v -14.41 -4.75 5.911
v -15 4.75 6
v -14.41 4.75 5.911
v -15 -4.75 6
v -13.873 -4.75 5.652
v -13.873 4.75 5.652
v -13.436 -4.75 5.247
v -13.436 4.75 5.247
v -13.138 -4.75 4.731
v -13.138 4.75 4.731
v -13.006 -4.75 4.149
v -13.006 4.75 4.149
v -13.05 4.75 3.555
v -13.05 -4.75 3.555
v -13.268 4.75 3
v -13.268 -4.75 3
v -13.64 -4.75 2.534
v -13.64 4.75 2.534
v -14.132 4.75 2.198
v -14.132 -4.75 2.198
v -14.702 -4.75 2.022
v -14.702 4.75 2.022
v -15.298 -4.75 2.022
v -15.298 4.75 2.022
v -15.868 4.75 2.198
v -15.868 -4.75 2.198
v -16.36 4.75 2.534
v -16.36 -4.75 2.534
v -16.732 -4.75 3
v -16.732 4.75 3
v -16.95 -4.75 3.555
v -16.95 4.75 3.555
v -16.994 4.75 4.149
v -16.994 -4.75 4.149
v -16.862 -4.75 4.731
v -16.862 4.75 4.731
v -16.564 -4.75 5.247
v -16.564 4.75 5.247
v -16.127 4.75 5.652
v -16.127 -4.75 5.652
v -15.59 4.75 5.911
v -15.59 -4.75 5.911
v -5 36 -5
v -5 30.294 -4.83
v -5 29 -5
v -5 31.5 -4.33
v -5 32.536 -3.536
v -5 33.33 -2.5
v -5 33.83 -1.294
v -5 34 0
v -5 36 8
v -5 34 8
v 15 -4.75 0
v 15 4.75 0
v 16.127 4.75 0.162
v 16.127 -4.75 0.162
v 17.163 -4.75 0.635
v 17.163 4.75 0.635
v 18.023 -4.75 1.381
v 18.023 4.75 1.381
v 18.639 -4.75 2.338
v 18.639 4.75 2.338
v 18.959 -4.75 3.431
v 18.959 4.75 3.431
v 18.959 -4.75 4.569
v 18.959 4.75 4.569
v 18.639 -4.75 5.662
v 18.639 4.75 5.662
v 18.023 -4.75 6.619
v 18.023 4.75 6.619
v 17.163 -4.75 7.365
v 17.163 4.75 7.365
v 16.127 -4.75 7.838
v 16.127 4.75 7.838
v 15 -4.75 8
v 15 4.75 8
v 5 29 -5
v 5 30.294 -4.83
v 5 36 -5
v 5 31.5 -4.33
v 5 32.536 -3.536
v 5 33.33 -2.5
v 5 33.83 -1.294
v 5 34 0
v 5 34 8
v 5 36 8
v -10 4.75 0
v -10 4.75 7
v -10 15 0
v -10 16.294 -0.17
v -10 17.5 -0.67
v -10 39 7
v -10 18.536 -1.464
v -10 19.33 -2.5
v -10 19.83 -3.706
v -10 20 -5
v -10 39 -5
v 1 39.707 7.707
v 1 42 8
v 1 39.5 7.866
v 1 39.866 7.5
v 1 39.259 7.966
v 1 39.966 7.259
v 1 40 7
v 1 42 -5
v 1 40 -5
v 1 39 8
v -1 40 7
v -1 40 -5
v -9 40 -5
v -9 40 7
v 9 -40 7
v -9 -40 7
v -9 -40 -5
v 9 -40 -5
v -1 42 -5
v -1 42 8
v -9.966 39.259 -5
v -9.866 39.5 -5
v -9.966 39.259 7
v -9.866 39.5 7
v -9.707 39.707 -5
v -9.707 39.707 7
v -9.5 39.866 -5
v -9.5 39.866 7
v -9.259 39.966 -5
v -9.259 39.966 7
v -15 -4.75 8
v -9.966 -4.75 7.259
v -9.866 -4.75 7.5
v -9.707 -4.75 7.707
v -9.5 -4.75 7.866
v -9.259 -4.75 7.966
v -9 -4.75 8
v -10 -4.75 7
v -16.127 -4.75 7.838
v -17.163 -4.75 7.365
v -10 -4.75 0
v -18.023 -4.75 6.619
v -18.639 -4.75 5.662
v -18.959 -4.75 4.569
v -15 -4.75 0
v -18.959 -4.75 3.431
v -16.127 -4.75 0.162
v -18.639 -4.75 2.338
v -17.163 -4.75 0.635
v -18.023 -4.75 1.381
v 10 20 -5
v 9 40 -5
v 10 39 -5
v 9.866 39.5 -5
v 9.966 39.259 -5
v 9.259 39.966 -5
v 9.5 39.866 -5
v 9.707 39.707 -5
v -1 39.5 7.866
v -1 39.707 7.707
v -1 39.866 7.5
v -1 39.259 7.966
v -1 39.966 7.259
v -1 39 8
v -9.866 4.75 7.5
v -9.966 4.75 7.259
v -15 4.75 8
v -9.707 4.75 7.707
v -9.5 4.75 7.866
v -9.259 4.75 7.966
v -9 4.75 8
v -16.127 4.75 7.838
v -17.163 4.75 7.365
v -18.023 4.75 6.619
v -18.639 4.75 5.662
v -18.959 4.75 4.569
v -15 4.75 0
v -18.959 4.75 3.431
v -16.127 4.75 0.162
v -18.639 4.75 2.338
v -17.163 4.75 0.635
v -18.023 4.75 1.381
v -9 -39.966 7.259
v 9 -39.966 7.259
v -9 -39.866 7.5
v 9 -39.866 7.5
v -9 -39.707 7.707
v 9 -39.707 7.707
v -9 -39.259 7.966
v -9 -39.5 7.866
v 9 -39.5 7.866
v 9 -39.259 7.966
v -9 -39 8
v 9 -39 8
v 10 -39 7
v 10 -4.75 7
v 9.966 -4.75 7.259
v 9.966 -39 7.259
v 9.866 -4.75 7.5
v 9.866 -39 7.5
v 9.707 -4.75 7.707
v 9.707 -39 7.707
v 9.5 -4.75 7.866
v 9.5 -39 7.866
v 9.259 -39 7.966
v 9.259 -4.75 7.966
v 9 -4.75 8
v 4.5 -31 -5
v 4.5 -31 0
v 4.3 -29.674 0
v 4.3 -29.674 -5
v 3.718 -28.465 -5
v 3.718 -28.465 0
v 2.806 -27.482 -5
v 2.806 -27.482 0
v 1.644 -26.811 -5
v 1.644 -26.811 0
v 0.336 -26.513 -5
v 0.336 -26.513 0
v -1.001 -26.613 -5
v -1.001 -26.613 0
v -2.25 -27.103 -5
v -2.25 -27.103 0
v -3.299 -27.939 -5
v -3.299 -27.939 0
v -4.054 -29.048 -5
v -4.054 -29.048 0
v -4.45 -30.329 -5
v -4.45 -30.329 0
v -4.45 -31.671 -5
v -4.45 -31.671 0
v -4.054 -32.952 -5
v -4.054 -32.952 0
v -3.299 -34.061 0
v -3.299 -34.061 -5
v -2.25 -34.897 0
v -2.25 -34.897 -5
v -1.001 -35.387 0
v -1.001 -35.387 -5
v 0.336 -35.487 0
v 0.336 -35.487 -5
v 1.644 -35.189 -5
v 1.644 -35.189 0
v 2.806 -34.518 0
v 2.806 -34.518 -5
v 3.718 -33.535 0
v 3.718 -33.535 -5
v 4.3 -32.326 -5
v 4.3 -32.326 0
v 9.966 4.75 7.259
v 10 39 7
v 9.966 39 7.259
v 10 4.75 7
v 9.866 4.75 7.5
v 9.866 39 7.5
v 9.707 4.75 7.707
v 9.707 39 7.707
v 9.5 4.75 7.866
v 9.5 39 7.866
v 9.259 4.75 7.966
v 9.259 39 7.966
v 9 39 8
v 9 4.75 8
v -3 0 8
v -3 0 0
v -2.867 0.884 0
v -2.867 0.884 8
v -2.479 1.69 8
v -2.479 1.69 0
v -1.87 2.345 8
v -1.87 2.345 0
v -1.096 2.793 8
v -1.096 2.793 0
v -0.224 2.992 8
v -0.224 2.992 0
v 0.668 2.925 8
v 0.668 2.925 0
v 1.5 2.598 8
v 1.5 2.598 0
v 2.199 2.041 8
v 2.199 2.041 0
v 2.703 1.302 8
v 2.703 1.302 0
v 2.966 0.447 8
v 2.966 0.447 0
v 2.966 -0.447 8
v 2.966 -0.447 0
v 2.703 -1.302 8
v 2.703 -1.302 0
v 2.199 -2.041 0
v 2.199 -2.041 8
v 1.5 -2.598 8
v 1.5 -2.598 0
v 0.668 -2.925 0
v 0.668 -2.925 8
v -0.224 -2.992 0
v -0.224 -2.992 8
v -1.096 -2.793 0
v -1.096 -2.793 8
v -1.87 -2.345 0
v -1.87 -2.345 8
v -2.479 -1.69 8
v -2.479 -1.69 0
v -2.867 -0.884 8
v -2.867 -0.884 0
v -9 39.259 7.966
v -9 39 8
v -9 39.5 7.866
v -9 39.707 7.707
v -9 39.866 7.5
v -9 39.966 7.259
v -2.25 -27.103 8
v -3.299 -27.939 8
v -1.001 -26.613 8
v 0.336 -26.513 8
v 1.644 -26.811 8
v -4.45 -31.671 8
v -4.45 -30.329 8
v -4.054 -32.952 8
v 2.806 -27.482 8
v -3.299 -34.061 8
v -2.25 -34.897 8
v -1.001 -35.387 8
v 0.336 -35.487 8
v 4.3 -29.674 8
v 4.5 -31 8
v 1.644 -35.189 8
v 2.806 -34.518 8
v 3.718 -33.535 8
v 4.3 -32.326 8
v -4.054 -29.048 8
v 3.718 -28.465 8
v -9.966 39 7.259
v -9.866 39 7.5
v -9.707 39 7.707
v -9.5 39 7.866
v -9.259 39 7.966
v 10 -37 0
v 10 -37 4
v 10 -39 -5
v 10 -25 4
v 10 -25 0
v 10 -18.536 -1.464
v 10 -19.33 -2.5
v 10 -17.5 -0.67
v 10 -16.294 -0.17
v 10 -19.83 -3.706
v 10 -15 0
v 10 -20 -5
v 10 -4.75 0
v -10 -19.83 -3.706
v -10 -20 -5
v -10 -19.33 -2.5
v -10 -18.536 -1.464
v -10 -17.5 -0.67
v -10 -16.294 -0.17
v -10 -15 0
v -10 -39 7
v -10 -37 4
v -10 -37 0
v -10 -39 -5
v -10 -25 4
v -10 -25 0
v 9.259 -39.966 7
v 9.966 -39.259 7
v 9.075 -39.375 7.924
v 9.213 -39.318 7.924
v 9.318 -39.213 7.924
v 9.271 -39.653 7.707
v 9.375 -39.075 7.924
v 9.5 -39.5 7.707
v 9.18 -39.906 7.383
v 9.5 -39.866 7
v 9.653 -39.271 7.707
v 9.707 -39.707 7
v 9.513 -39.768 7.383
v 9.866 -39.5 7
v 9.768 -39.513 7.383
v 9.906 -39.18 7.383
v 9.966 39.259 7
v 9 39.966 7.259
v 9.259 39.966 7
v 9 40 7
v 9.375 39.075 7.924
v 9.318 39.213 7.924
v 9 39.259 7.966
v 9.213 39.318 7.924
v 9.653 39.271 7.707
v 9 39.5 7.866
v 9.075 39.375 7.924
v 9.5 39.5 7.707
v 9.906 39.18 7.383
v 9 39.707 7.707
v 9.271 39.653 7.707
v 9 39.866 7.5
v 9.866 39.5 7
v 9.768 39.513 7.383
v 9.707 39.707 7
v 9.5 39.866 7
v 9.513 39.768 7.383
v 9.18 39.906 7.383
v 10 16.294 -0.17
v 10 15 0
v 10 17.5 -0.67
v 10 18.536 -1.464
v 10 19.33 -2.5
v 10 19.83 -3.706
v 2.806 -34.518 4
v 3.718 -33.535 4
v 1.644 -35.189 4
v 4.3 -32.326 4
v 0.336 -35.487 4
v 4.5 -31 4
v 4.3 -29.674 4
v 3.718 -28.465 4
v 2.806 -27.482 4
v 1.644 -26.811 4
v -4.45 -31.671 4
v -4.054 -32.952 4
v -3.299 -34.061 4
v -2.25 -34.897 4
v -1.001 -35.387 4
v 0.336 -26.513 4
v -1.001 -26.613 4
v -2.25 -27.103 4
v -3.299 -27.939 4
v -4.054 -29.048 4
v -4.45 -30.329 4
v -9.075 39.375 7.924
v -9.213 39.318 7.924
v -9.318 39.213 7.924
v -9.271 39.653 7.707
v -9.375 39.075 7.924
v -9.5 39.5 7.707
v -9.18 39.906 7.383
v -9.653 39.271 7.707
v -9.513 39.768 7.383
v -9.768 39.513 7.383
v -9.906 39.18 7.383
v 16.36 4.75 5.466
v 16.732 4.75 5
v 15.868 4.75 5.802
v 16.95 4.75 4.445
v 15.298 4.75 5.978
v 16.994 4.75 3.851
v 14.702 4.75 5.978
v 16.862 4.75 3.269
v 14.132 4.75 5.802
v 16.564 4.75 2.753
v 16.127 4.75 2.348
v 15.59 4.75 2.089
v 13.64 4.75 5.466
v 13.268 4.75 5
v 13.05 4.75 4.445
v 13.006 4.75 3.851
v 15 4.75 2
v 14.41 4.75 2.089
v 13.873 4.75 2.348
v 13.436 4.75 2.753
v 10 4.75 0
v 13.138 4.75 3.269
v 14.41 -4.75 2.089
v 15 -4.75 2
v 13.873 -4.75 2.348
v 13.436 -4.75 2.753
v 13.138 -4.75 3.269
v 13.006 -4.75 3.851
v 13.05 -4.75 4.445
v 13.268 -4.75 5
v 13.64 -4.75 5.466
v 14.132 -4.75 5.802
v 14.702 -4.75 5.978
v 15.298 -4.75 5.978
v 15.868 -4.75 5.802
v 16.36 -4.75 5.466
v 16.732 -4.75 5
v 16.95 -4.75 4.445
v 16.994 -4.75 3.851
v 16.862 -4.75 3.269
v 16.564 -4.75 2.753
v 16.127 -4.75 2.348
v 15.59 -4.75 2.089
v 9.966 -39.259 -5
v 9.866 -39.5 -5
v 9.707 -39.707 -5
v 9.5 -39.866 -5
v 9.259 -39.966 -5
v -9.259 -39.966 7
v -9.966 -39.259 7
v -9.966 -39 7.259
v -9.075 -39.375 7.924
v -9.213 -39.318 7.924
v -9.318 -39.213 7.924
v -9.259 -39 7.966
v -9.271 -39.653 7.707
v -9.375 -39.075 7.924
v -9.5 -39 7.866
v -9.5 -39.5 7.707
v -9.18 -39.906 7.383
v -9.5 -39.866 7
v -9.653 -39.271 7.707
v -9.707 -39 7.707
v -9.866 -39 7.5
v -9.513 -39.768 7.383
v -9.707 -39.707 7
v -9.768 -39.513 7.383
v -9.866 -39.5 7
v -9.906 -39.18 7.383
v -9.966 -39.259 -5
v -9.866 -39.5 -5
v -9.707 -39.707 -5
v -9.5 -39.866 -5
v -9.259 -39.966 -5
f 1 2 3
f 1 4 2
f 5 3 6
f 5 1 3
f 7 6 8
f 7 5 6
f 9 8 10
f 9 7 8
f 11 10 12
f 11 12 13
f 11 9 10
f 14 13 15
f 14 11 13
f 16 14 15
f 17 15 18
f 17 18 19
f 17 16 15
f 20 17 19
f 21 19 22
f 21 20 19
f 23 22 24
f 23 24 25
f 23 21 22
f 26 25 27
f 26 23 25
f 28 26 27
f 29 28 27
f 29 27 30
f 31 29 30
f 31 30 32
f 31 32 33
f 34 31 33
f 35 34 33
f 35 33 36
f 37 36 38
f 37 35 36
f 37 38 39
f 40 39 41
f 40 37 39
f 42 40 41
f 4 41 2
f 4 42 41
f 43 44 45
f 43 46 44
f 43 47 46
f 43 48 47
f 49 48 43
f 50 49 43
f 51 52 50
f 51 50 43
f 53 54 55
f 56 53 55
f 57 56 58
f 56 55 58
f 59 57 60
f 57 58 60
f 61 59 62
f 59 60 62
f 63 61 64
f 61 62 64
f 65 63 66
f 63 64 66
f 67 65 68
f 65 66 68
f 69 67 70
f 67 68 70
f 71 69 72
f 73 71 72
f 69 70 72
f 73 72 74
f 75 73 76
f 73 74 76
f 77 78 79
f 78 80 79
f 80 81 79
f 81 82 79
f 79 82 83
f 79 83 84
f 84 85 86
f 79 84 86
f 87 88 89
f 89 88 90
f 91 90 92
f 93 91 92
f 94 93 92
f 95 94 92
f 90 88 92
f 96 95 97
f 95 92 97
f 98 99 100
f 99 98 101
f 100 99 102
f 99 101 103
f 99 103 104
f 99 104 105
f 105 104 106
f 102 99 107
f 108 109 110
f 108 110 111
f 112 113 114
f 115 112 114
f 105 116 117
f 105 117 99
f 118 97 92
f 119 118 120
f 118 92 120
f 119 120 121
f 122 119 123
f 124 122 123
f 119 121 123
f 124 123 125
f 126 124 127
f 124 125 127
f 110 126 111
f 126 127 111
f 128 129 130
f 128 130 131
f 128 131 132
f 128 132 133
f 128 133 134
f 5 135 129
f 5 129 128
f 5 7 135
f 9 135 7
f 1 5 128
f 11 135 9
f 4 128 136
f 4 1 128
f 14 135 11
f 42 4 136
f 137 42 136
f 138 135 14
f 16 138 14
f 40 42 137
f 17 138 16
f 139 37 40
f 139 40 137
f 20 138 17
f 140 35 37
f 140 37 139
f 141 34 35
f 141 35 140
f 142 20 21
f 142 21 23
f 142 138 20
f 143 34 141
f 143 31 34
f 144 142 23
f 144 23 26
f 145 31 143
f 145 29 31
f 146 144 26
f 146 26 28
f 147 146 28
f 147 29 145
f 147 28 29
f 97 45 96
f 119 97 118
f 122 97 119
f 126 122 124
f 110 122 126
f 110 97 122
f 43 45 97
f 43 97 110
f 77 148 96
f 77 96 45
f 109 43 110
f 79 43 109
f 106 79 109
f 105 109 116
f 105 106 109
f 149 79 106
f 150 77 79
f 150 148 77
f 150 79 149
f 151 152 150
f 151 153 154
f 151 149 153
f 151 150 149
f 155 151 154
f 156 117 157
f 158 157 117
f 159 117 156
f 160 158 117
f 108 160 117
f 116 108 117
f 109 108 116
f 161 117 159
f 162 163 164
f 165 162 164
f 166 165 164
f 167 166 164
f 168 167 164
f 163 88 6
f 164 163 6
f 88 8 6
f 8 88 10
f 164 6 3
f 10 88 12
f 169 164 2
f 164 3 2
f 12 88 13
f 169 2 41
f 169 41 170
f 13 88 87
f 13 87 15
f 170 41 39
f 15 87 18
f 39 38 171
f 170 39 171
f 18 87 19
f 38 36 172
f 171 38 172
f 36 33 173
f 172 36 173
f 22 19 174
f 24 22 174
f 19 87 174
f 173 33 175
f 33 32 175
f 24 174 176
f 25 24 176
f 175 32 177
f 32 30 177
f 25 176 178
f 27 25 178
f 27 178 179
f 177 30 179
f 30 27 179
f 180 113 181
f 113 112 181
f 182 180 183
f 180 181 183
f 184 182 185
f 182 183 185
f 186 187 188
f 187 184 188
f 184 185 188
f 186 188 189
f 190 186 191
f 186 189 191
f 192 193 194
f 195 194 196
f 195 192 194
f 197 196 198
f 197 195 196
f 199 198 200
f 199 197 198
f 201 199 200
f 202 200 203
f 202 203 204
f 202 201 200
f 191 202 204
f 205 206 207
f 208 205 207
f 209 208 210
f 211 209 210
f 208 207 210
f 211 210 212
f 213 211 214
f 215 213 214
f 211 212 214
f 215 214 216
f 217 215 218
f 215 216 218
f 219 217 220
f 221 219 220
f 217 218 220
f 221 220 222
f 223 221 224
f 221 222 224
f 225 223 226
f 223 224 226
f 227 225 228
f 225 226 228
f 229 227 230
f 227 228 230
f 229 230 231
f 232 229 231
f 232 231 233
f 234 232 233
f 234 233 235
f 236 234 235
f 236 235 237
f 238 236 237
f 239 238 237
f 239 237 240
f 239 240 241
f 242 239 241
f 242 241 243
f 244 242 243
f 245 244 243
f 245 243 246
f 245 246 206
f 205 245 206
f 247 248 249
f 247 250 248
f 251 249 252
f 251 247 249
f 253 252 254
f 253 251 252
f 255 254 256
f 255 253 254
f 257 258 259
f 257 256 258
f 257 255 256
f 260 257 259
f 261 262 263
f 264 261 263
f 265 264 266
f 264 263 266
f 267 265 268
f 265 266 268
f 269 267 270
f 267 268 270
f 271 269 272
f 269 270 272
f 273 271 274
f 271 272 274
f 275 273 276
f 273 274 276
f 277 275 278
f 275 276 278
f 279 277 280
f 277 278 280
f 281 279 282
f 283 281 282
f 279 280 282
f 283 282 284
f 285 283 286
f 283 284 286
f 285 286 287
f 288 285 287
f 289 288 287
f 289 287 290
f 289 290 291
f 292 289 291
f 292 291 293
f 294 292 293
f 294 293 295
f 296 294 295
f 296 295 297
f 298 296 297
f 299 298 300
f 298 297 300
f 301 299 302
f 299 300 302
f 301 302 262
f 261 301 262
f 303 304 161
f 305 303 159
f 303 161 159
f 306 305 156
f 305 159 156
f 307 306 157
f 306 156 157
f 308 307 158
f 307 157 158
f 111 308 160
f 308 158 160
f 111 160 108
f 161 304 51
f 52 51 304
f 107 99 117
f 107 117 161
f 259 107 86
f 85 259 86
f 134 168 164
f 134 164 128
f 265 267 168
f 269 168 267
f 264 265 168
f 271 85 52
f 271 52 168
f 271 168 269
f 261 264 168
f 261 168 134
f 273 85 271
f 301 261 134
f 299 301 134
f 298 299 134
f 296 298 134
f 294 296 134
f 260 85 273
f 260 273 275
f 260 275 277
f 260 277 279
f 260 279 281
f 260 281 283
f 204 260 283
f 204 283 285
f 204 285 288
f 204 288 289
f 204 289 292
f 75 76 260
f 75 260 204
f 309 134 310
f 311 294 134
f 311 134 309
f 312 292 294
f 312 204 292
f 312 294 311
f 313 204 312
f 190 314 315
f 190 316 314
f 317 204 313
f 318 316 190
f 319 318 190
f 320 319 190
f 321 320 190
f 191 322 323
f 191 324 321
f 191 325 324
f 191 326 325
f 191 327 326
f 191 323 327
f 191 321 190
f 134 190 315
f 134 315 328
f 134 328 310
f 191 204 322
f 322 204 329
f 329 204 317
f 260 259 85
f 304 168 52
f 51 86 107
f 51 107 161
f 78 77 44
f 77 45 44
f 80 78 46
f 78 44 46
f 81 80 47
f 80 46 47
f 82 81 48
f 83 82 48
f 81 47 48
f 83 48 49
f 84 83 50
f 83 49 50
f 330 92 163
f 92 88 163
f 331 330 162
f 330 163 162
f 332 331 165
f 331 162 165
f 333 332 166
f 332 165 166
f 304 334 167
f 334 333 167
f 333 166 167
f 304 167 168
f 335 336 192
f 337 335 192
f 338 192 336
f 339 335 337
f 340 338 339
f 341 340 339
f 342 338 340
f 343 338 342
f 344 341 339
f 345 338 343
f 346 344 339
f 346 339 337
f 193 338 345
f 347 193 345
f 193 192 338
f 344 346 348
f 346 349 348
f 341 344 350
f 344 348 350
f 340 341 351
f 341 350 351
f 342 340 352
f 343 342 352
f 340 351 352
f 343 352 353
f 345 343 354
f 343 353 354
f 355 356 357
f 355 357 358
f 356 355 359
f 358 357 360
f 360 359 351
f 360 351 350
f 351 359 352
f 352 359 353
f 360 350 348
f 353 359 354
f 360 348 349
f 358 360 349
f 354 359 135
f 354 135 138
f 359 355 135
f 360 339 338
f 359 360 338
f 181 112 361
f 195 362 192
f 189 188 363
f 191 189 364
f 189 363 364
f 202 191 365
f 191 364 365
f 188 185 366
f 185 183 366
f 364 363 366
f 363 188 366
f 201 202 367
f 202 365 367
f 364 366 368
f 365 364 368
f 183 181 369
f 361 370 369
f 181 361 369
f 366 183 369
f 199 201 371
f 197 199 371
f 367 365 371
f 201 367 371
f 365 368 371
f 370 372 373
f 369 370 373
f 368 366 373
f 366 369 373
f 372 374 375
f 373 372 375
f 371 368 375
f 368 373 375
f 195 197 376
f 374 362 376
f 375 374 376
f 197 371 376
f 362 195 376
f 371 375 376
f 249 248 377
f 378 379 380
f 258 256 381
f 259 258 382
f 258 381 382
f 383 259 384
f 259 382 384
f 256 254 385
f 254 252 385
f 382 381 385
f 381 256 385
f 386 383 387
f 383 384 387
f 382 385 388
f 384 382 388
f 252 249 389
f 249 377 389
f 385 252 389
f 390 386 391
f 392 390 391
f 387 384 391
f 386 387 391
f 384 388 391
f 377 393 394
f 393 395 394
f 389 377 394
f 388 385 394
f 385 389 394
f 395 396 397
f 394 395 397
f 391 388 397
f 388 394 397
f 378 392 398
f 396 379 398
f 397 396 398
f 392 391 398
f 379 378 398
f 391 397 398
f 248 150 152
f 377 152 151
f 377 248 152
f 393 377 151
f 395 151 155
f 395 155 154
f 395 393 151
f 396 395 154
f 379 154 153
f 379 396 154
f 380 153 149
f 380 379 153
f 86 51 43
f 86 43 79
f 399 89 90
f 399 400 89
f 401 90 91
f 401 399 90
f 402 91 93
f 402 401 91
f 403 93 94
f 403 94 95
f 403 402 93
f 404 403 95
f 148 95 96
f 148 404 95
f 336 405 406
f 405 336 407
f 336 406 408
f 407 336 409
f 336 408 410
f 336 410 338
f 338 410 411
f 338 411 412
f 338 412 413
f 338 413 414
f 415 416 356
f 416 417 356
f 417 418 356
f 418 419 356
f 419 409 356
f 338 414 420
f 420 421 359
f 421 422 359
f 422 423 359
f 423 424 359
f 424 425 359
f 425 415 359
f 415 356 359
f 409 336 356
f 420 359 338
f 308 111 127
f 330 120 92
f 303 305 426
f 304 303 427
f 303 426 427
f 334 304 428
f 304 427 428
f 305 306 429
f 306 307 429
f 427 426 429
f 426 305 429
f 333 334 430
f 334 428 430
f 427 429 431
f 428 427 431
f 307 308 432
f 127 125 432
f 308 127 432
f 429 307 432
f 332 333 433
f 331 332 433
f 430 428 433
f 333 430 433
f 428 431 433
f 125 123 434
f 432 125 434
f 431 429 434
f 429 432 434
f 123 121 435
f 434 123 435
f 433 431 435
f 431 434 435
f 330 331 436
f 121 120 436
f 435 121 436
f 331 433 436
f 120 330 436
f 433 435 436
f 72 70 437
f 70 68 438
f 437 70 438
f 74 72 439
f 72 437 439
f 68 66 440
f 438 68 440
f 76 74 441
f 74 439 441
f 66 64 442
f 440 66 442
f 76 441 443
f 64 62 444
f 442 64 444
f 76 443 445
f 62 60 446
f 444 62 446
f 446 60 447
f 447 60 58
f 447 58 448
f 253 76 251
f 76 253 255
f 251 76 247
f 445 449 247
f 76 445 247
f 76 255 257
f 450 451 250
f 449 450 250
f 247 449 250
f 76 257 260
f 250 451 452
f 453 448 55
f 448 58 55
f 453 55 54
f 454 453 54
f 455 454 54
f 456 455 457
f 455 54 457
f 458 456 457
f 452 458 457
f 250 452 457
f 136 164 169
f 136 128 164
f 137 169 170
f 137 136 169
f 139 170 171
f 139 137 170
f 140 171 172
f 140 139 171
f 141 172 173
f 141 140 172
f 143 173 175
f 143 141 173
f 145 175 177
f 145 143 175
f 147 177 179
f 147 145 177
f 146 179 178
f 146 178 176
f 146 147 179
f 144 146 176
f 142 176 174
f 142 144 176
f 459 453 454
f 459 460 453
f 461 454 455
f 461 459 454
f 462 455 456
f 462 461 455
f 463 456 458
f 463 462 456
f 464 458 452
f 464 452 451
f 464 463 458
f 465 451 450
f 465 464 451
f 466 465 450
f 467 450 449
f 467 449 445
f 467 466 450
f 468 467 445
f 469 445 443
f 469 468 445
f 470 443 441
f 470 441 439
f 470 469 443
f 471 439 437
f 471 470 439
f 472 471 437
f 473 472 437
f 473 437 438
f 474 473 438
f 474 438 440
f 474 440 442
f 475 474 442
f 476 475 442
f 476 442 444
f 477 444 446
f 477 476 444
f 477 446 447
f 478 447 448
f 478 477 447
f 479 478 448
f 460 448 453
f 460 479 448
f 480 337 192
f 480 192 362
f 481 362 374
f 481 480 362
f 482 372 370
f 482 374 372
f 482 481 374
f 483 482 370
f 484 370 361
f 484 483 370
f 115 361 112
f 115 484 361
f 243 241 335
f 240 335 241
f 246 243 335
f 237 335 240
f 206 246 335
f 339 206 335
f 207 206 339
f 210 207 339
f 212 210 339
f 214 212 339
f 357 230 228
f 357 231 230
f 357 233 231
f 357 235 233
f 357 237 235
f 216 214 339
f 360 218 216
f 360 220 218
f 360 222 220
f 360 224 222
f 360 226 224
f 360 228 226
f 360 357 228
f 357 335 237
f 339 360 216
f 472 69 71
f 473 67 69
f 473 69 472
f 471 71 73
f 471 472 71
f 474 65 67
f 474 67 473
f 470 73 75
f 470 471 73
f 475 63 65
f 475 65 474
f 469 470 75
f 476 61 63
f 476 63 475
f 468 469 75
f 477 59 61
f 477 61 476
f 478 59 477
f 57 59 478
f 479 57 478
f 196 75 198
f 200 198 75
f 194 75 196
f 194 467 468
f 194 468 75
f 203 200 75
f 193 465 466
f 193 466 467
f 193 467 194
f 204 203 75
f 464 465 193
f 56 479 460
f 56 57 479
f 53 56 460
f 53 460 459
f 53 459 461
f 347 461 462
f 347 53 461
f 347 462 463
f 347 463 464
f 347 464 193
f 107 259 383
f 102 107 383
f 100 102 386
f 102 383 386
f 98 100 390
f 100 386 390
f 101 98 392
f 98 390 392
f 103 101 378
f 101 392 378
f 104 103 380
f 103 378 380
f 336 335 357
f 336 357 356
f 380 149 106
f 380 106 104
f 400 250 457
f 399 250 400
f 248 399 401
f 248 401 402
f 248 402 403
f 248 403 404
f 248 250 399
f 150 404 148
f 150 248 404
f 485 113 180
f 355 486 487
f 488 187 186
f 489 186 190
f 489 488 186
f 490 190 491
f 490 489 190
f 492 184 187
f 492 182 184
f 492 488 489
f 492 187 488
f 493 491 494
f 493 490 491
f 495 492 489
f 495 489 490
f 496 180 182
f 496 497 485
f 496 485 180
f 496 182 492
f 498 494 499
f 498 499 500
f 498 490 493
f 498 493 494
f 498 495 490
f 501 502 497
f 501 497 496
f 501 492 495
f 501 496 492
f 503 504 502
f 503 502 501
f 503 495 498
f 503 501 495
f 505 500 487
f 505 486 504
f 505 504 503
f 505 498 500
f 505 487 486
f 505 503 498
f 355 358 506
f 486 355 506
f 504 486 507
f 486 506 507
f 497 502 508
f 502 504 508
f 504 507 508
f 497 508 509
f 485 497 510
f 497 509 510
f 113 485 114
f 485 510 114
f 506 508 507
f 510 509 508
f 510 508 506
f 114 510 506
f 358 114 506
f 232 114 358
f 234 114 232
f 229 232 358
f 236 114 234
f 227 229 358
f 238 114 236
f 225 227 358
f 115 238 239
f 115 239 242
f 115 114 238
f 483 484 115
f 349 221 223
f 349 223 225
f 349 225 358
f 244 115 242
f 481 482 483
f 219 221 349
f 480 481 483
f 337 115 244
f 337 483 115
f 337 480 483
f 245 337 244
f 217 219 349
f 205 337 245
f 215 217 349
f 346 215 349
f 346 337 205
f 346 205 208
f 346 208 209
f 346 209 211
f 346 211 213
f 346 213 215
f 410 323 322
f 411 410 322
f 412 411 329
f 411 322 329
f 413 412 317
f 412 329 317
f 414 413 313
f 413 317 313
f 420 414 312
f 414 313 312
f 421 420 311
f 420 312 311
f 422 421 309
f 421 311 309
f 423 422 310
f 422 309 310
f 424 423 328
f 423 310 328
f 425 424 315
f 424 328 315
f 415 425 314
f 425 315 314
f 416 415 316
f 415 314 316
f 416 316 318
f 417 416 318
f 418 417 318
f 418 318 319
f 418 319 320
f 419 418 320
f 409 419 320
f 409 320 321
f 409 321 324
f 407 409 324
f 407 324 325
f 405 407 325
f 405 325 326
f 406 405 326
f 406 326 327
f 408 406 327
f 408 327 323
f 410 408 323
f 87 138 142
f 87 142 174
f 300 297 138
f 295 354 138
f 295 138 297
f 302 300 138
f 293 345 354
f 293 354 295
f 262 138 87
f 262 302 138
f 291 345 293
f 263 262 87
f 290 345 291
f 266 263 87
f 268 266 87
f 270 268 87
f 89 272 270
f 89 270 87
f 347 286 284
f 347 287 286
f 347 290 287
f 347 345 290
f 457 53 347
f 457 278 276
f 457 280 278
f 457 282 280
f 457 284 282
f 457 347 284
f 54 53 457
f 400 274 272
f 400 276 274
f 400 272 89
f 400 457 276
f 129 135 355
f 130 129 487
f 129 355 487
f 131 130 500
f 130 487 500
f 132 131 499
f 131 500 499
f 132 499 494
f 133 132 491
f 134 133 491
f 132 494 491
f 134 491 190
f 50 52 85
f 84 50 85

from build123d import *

# Parameters (mm, degrees)
BOSS_EXTRUDE1_DEPTH      = 10
SKETCH7_R                = 2
BOSS_EXTRUDE4_DEPTH      = 4.75
SKETCH8_R                = 3
CUT_EXTRUDE1_DEPTH       = 8
FILLET1_R                = 1
M8_CLEARANCE_HOLE1_D     = 9
FILLET2_R                = 5
SKETCH15_W               = 4
SKETCH15_H               = 12
CUT_EXTRUDE2_DEPTH       = 20
SKETCH16_W               = 10
SKETCH16_H               = 2
CUT_EXTRUDE3_DEPTH       = 47.151923037
FILLET3_R                = 5
BOSS_EXTRUDE5_DEPTH      = 2
BOSS_EXTRUDE5_DEPTH_BACK = 2
SKETCH17_W               = 2
SKETCH17_H               = 13


with BuildPart() as part:
    # Sketch1 → Boss-Extrude1 (new, symmetric)
    with BuildSketch(Plane(origin=(0, 0, 0), x_dir=(0, 0, -1), z_dir=(1, 0, 0))):
        Polygon((0, -20), (0, 20), (5, 20), (5, 40), (-8, 40), (-8, 20), (-8, -20), (-8, -40), (5, -40), (5, -20), align=None)
    extrude(amount=BOSS_EXTRUDE1_DEPTH, both=True)

    # Sketch7 → Boss-Extrude4 (add, symmetric)
    # profile 1 of 2: a face of its own
    with BuildSketch(Plane(origin=(0, 0, 0), x_dir=(1, 0, 0), z_dir=(0, 1, 0))):
        with BuildLine():
            Line((-15, 0), (-10, 0))
            Line((-10, 0), (-10, -8))
            Line((-10, -8), (-15, -8))
            ThreePointArc((-15, -8), (-19, -4), (-15, 0))
        make_face()
        with Locations(Location((-15, -4, 0), (0, 0, 270))):
            Circle(SKETCH7_R, mode=Mode.SUBTRACT)
    # profile 2 of 2: a face of its own
    with BuildSketch(Plane(origin=(0, 0, 0), x_dir=(1, 0, 0), z_dir=(0, 1, 0))):
        with BuildLine():
            Line((15, -8), (10, -8))
            Line((10, -8), (10, 0))
            Line((10, 0), (15, 0))
            ThreePointArc((15, 0), (19, -4), (15, -8))
        make_face()
        with Locations(Location((15, -4, 0), (0, 0, 90))):
            Circle(SKETCH7_R, mode=Mode.SUBTRACT)
    extrude(amount=BOSS_EXTRUDE4_DEPTH, both=True)

    # Sketch8 → Cut-Extrude1 (cut)
    with BuildSketch(Plane(origin=(0, 0, 0), x_dir=(-1, 0, 0), z_dir=(0, 0, -1))):
        Circle(SKETCH8_R)
    extrude(amount=-CUT_EXTRUDE1_DEPTH, mode=Mode.SUBTRACT)

    # Fillet1
    fillet1_edges = [part.edges().sort_by_distance(p)[0] for p in [
        (-10, -40, 1.5),
        (10, -40, 1.5),
        (-10, 40, 1.5),
        (10, 40, 1.5),
        (0, -40, 8),
        (-10, -22.375, 8),
        (10, -22.375, 8),
        (10, 22.375, 8),
        (0, 40, 8),
        (-10, 22.375, 8),
    ]]
    fillet(fillet1_edges, radius=FILLET1_R)

    # M8 Clearance Hole1 (through all)
    with Locations(Plane(origin=(0, -31, -5), x_dir=(-1, 0, 0), z_dir=(0, 0, -1))):
        with Locations((0, 0)):
            Hole(M8_CLEARANCE_HOLE1_D / 2)

    # Fillet2
    fillet2_edges = [part.edges().sort_by_distance(p)[0] for p in [
        (0, 20, 0),
        (0, -20, 0),
    ]]
    fillet(fillet2_edges, radius=FILLET2_R - 0.0001)  # a hair under: the kernel refuses the full size

    # Sketch15 → Cut-Extrude2 (cut)
    with BuildSketch(Plane.ZY.offset(10)):
        with Locations((2, -31)):
            Rectangle(SKETCH15_W, SKETCH15_H)
    extrude(amount=-CUT_EXTRUDE2_DEPTH, mode=Mode.SUBTRACT)

    # Sketch16 → Cut-Extrude3 (cut, through all)
    with BuildSketch(Plane.XY.offset(8)):
        with Locations((0, 35)):
            Rectangle(SKETCH16_W, SKETCH16_H)
    extrude(amount=-CUT_EXTRUDE3_DEPTH, mode=Mode.SUBTRACT)

    # Fillet3
    fillet3_edges = [part.edges().sort_by_distance(p)[0] for p in [
        (0, 34, -5),
    ]]
    fillet(fillet3_edges, radius=FILLET3_R)

    # Sketch17 → Boss-Extrude5 (add, two sides: drawn at the far end of the back side and taken through both)
    with BuildSketch(Plane(origin=(0, 40, 0), x_dir=(1, 0, 0), z_dir=(0, 1, 0)).offset(-BOSS_EXTRUDE5_DEPTH_BACK)):
        with Locations((0, -1.5)):
            Rectangle(SKETCH17_W, SKETCH17_H)
    extrude(amount=BOSS_EXTRUDE5_DEPTH + BOSS_EXTRUDE5_DEPTH_BACK)


solid = part.part
